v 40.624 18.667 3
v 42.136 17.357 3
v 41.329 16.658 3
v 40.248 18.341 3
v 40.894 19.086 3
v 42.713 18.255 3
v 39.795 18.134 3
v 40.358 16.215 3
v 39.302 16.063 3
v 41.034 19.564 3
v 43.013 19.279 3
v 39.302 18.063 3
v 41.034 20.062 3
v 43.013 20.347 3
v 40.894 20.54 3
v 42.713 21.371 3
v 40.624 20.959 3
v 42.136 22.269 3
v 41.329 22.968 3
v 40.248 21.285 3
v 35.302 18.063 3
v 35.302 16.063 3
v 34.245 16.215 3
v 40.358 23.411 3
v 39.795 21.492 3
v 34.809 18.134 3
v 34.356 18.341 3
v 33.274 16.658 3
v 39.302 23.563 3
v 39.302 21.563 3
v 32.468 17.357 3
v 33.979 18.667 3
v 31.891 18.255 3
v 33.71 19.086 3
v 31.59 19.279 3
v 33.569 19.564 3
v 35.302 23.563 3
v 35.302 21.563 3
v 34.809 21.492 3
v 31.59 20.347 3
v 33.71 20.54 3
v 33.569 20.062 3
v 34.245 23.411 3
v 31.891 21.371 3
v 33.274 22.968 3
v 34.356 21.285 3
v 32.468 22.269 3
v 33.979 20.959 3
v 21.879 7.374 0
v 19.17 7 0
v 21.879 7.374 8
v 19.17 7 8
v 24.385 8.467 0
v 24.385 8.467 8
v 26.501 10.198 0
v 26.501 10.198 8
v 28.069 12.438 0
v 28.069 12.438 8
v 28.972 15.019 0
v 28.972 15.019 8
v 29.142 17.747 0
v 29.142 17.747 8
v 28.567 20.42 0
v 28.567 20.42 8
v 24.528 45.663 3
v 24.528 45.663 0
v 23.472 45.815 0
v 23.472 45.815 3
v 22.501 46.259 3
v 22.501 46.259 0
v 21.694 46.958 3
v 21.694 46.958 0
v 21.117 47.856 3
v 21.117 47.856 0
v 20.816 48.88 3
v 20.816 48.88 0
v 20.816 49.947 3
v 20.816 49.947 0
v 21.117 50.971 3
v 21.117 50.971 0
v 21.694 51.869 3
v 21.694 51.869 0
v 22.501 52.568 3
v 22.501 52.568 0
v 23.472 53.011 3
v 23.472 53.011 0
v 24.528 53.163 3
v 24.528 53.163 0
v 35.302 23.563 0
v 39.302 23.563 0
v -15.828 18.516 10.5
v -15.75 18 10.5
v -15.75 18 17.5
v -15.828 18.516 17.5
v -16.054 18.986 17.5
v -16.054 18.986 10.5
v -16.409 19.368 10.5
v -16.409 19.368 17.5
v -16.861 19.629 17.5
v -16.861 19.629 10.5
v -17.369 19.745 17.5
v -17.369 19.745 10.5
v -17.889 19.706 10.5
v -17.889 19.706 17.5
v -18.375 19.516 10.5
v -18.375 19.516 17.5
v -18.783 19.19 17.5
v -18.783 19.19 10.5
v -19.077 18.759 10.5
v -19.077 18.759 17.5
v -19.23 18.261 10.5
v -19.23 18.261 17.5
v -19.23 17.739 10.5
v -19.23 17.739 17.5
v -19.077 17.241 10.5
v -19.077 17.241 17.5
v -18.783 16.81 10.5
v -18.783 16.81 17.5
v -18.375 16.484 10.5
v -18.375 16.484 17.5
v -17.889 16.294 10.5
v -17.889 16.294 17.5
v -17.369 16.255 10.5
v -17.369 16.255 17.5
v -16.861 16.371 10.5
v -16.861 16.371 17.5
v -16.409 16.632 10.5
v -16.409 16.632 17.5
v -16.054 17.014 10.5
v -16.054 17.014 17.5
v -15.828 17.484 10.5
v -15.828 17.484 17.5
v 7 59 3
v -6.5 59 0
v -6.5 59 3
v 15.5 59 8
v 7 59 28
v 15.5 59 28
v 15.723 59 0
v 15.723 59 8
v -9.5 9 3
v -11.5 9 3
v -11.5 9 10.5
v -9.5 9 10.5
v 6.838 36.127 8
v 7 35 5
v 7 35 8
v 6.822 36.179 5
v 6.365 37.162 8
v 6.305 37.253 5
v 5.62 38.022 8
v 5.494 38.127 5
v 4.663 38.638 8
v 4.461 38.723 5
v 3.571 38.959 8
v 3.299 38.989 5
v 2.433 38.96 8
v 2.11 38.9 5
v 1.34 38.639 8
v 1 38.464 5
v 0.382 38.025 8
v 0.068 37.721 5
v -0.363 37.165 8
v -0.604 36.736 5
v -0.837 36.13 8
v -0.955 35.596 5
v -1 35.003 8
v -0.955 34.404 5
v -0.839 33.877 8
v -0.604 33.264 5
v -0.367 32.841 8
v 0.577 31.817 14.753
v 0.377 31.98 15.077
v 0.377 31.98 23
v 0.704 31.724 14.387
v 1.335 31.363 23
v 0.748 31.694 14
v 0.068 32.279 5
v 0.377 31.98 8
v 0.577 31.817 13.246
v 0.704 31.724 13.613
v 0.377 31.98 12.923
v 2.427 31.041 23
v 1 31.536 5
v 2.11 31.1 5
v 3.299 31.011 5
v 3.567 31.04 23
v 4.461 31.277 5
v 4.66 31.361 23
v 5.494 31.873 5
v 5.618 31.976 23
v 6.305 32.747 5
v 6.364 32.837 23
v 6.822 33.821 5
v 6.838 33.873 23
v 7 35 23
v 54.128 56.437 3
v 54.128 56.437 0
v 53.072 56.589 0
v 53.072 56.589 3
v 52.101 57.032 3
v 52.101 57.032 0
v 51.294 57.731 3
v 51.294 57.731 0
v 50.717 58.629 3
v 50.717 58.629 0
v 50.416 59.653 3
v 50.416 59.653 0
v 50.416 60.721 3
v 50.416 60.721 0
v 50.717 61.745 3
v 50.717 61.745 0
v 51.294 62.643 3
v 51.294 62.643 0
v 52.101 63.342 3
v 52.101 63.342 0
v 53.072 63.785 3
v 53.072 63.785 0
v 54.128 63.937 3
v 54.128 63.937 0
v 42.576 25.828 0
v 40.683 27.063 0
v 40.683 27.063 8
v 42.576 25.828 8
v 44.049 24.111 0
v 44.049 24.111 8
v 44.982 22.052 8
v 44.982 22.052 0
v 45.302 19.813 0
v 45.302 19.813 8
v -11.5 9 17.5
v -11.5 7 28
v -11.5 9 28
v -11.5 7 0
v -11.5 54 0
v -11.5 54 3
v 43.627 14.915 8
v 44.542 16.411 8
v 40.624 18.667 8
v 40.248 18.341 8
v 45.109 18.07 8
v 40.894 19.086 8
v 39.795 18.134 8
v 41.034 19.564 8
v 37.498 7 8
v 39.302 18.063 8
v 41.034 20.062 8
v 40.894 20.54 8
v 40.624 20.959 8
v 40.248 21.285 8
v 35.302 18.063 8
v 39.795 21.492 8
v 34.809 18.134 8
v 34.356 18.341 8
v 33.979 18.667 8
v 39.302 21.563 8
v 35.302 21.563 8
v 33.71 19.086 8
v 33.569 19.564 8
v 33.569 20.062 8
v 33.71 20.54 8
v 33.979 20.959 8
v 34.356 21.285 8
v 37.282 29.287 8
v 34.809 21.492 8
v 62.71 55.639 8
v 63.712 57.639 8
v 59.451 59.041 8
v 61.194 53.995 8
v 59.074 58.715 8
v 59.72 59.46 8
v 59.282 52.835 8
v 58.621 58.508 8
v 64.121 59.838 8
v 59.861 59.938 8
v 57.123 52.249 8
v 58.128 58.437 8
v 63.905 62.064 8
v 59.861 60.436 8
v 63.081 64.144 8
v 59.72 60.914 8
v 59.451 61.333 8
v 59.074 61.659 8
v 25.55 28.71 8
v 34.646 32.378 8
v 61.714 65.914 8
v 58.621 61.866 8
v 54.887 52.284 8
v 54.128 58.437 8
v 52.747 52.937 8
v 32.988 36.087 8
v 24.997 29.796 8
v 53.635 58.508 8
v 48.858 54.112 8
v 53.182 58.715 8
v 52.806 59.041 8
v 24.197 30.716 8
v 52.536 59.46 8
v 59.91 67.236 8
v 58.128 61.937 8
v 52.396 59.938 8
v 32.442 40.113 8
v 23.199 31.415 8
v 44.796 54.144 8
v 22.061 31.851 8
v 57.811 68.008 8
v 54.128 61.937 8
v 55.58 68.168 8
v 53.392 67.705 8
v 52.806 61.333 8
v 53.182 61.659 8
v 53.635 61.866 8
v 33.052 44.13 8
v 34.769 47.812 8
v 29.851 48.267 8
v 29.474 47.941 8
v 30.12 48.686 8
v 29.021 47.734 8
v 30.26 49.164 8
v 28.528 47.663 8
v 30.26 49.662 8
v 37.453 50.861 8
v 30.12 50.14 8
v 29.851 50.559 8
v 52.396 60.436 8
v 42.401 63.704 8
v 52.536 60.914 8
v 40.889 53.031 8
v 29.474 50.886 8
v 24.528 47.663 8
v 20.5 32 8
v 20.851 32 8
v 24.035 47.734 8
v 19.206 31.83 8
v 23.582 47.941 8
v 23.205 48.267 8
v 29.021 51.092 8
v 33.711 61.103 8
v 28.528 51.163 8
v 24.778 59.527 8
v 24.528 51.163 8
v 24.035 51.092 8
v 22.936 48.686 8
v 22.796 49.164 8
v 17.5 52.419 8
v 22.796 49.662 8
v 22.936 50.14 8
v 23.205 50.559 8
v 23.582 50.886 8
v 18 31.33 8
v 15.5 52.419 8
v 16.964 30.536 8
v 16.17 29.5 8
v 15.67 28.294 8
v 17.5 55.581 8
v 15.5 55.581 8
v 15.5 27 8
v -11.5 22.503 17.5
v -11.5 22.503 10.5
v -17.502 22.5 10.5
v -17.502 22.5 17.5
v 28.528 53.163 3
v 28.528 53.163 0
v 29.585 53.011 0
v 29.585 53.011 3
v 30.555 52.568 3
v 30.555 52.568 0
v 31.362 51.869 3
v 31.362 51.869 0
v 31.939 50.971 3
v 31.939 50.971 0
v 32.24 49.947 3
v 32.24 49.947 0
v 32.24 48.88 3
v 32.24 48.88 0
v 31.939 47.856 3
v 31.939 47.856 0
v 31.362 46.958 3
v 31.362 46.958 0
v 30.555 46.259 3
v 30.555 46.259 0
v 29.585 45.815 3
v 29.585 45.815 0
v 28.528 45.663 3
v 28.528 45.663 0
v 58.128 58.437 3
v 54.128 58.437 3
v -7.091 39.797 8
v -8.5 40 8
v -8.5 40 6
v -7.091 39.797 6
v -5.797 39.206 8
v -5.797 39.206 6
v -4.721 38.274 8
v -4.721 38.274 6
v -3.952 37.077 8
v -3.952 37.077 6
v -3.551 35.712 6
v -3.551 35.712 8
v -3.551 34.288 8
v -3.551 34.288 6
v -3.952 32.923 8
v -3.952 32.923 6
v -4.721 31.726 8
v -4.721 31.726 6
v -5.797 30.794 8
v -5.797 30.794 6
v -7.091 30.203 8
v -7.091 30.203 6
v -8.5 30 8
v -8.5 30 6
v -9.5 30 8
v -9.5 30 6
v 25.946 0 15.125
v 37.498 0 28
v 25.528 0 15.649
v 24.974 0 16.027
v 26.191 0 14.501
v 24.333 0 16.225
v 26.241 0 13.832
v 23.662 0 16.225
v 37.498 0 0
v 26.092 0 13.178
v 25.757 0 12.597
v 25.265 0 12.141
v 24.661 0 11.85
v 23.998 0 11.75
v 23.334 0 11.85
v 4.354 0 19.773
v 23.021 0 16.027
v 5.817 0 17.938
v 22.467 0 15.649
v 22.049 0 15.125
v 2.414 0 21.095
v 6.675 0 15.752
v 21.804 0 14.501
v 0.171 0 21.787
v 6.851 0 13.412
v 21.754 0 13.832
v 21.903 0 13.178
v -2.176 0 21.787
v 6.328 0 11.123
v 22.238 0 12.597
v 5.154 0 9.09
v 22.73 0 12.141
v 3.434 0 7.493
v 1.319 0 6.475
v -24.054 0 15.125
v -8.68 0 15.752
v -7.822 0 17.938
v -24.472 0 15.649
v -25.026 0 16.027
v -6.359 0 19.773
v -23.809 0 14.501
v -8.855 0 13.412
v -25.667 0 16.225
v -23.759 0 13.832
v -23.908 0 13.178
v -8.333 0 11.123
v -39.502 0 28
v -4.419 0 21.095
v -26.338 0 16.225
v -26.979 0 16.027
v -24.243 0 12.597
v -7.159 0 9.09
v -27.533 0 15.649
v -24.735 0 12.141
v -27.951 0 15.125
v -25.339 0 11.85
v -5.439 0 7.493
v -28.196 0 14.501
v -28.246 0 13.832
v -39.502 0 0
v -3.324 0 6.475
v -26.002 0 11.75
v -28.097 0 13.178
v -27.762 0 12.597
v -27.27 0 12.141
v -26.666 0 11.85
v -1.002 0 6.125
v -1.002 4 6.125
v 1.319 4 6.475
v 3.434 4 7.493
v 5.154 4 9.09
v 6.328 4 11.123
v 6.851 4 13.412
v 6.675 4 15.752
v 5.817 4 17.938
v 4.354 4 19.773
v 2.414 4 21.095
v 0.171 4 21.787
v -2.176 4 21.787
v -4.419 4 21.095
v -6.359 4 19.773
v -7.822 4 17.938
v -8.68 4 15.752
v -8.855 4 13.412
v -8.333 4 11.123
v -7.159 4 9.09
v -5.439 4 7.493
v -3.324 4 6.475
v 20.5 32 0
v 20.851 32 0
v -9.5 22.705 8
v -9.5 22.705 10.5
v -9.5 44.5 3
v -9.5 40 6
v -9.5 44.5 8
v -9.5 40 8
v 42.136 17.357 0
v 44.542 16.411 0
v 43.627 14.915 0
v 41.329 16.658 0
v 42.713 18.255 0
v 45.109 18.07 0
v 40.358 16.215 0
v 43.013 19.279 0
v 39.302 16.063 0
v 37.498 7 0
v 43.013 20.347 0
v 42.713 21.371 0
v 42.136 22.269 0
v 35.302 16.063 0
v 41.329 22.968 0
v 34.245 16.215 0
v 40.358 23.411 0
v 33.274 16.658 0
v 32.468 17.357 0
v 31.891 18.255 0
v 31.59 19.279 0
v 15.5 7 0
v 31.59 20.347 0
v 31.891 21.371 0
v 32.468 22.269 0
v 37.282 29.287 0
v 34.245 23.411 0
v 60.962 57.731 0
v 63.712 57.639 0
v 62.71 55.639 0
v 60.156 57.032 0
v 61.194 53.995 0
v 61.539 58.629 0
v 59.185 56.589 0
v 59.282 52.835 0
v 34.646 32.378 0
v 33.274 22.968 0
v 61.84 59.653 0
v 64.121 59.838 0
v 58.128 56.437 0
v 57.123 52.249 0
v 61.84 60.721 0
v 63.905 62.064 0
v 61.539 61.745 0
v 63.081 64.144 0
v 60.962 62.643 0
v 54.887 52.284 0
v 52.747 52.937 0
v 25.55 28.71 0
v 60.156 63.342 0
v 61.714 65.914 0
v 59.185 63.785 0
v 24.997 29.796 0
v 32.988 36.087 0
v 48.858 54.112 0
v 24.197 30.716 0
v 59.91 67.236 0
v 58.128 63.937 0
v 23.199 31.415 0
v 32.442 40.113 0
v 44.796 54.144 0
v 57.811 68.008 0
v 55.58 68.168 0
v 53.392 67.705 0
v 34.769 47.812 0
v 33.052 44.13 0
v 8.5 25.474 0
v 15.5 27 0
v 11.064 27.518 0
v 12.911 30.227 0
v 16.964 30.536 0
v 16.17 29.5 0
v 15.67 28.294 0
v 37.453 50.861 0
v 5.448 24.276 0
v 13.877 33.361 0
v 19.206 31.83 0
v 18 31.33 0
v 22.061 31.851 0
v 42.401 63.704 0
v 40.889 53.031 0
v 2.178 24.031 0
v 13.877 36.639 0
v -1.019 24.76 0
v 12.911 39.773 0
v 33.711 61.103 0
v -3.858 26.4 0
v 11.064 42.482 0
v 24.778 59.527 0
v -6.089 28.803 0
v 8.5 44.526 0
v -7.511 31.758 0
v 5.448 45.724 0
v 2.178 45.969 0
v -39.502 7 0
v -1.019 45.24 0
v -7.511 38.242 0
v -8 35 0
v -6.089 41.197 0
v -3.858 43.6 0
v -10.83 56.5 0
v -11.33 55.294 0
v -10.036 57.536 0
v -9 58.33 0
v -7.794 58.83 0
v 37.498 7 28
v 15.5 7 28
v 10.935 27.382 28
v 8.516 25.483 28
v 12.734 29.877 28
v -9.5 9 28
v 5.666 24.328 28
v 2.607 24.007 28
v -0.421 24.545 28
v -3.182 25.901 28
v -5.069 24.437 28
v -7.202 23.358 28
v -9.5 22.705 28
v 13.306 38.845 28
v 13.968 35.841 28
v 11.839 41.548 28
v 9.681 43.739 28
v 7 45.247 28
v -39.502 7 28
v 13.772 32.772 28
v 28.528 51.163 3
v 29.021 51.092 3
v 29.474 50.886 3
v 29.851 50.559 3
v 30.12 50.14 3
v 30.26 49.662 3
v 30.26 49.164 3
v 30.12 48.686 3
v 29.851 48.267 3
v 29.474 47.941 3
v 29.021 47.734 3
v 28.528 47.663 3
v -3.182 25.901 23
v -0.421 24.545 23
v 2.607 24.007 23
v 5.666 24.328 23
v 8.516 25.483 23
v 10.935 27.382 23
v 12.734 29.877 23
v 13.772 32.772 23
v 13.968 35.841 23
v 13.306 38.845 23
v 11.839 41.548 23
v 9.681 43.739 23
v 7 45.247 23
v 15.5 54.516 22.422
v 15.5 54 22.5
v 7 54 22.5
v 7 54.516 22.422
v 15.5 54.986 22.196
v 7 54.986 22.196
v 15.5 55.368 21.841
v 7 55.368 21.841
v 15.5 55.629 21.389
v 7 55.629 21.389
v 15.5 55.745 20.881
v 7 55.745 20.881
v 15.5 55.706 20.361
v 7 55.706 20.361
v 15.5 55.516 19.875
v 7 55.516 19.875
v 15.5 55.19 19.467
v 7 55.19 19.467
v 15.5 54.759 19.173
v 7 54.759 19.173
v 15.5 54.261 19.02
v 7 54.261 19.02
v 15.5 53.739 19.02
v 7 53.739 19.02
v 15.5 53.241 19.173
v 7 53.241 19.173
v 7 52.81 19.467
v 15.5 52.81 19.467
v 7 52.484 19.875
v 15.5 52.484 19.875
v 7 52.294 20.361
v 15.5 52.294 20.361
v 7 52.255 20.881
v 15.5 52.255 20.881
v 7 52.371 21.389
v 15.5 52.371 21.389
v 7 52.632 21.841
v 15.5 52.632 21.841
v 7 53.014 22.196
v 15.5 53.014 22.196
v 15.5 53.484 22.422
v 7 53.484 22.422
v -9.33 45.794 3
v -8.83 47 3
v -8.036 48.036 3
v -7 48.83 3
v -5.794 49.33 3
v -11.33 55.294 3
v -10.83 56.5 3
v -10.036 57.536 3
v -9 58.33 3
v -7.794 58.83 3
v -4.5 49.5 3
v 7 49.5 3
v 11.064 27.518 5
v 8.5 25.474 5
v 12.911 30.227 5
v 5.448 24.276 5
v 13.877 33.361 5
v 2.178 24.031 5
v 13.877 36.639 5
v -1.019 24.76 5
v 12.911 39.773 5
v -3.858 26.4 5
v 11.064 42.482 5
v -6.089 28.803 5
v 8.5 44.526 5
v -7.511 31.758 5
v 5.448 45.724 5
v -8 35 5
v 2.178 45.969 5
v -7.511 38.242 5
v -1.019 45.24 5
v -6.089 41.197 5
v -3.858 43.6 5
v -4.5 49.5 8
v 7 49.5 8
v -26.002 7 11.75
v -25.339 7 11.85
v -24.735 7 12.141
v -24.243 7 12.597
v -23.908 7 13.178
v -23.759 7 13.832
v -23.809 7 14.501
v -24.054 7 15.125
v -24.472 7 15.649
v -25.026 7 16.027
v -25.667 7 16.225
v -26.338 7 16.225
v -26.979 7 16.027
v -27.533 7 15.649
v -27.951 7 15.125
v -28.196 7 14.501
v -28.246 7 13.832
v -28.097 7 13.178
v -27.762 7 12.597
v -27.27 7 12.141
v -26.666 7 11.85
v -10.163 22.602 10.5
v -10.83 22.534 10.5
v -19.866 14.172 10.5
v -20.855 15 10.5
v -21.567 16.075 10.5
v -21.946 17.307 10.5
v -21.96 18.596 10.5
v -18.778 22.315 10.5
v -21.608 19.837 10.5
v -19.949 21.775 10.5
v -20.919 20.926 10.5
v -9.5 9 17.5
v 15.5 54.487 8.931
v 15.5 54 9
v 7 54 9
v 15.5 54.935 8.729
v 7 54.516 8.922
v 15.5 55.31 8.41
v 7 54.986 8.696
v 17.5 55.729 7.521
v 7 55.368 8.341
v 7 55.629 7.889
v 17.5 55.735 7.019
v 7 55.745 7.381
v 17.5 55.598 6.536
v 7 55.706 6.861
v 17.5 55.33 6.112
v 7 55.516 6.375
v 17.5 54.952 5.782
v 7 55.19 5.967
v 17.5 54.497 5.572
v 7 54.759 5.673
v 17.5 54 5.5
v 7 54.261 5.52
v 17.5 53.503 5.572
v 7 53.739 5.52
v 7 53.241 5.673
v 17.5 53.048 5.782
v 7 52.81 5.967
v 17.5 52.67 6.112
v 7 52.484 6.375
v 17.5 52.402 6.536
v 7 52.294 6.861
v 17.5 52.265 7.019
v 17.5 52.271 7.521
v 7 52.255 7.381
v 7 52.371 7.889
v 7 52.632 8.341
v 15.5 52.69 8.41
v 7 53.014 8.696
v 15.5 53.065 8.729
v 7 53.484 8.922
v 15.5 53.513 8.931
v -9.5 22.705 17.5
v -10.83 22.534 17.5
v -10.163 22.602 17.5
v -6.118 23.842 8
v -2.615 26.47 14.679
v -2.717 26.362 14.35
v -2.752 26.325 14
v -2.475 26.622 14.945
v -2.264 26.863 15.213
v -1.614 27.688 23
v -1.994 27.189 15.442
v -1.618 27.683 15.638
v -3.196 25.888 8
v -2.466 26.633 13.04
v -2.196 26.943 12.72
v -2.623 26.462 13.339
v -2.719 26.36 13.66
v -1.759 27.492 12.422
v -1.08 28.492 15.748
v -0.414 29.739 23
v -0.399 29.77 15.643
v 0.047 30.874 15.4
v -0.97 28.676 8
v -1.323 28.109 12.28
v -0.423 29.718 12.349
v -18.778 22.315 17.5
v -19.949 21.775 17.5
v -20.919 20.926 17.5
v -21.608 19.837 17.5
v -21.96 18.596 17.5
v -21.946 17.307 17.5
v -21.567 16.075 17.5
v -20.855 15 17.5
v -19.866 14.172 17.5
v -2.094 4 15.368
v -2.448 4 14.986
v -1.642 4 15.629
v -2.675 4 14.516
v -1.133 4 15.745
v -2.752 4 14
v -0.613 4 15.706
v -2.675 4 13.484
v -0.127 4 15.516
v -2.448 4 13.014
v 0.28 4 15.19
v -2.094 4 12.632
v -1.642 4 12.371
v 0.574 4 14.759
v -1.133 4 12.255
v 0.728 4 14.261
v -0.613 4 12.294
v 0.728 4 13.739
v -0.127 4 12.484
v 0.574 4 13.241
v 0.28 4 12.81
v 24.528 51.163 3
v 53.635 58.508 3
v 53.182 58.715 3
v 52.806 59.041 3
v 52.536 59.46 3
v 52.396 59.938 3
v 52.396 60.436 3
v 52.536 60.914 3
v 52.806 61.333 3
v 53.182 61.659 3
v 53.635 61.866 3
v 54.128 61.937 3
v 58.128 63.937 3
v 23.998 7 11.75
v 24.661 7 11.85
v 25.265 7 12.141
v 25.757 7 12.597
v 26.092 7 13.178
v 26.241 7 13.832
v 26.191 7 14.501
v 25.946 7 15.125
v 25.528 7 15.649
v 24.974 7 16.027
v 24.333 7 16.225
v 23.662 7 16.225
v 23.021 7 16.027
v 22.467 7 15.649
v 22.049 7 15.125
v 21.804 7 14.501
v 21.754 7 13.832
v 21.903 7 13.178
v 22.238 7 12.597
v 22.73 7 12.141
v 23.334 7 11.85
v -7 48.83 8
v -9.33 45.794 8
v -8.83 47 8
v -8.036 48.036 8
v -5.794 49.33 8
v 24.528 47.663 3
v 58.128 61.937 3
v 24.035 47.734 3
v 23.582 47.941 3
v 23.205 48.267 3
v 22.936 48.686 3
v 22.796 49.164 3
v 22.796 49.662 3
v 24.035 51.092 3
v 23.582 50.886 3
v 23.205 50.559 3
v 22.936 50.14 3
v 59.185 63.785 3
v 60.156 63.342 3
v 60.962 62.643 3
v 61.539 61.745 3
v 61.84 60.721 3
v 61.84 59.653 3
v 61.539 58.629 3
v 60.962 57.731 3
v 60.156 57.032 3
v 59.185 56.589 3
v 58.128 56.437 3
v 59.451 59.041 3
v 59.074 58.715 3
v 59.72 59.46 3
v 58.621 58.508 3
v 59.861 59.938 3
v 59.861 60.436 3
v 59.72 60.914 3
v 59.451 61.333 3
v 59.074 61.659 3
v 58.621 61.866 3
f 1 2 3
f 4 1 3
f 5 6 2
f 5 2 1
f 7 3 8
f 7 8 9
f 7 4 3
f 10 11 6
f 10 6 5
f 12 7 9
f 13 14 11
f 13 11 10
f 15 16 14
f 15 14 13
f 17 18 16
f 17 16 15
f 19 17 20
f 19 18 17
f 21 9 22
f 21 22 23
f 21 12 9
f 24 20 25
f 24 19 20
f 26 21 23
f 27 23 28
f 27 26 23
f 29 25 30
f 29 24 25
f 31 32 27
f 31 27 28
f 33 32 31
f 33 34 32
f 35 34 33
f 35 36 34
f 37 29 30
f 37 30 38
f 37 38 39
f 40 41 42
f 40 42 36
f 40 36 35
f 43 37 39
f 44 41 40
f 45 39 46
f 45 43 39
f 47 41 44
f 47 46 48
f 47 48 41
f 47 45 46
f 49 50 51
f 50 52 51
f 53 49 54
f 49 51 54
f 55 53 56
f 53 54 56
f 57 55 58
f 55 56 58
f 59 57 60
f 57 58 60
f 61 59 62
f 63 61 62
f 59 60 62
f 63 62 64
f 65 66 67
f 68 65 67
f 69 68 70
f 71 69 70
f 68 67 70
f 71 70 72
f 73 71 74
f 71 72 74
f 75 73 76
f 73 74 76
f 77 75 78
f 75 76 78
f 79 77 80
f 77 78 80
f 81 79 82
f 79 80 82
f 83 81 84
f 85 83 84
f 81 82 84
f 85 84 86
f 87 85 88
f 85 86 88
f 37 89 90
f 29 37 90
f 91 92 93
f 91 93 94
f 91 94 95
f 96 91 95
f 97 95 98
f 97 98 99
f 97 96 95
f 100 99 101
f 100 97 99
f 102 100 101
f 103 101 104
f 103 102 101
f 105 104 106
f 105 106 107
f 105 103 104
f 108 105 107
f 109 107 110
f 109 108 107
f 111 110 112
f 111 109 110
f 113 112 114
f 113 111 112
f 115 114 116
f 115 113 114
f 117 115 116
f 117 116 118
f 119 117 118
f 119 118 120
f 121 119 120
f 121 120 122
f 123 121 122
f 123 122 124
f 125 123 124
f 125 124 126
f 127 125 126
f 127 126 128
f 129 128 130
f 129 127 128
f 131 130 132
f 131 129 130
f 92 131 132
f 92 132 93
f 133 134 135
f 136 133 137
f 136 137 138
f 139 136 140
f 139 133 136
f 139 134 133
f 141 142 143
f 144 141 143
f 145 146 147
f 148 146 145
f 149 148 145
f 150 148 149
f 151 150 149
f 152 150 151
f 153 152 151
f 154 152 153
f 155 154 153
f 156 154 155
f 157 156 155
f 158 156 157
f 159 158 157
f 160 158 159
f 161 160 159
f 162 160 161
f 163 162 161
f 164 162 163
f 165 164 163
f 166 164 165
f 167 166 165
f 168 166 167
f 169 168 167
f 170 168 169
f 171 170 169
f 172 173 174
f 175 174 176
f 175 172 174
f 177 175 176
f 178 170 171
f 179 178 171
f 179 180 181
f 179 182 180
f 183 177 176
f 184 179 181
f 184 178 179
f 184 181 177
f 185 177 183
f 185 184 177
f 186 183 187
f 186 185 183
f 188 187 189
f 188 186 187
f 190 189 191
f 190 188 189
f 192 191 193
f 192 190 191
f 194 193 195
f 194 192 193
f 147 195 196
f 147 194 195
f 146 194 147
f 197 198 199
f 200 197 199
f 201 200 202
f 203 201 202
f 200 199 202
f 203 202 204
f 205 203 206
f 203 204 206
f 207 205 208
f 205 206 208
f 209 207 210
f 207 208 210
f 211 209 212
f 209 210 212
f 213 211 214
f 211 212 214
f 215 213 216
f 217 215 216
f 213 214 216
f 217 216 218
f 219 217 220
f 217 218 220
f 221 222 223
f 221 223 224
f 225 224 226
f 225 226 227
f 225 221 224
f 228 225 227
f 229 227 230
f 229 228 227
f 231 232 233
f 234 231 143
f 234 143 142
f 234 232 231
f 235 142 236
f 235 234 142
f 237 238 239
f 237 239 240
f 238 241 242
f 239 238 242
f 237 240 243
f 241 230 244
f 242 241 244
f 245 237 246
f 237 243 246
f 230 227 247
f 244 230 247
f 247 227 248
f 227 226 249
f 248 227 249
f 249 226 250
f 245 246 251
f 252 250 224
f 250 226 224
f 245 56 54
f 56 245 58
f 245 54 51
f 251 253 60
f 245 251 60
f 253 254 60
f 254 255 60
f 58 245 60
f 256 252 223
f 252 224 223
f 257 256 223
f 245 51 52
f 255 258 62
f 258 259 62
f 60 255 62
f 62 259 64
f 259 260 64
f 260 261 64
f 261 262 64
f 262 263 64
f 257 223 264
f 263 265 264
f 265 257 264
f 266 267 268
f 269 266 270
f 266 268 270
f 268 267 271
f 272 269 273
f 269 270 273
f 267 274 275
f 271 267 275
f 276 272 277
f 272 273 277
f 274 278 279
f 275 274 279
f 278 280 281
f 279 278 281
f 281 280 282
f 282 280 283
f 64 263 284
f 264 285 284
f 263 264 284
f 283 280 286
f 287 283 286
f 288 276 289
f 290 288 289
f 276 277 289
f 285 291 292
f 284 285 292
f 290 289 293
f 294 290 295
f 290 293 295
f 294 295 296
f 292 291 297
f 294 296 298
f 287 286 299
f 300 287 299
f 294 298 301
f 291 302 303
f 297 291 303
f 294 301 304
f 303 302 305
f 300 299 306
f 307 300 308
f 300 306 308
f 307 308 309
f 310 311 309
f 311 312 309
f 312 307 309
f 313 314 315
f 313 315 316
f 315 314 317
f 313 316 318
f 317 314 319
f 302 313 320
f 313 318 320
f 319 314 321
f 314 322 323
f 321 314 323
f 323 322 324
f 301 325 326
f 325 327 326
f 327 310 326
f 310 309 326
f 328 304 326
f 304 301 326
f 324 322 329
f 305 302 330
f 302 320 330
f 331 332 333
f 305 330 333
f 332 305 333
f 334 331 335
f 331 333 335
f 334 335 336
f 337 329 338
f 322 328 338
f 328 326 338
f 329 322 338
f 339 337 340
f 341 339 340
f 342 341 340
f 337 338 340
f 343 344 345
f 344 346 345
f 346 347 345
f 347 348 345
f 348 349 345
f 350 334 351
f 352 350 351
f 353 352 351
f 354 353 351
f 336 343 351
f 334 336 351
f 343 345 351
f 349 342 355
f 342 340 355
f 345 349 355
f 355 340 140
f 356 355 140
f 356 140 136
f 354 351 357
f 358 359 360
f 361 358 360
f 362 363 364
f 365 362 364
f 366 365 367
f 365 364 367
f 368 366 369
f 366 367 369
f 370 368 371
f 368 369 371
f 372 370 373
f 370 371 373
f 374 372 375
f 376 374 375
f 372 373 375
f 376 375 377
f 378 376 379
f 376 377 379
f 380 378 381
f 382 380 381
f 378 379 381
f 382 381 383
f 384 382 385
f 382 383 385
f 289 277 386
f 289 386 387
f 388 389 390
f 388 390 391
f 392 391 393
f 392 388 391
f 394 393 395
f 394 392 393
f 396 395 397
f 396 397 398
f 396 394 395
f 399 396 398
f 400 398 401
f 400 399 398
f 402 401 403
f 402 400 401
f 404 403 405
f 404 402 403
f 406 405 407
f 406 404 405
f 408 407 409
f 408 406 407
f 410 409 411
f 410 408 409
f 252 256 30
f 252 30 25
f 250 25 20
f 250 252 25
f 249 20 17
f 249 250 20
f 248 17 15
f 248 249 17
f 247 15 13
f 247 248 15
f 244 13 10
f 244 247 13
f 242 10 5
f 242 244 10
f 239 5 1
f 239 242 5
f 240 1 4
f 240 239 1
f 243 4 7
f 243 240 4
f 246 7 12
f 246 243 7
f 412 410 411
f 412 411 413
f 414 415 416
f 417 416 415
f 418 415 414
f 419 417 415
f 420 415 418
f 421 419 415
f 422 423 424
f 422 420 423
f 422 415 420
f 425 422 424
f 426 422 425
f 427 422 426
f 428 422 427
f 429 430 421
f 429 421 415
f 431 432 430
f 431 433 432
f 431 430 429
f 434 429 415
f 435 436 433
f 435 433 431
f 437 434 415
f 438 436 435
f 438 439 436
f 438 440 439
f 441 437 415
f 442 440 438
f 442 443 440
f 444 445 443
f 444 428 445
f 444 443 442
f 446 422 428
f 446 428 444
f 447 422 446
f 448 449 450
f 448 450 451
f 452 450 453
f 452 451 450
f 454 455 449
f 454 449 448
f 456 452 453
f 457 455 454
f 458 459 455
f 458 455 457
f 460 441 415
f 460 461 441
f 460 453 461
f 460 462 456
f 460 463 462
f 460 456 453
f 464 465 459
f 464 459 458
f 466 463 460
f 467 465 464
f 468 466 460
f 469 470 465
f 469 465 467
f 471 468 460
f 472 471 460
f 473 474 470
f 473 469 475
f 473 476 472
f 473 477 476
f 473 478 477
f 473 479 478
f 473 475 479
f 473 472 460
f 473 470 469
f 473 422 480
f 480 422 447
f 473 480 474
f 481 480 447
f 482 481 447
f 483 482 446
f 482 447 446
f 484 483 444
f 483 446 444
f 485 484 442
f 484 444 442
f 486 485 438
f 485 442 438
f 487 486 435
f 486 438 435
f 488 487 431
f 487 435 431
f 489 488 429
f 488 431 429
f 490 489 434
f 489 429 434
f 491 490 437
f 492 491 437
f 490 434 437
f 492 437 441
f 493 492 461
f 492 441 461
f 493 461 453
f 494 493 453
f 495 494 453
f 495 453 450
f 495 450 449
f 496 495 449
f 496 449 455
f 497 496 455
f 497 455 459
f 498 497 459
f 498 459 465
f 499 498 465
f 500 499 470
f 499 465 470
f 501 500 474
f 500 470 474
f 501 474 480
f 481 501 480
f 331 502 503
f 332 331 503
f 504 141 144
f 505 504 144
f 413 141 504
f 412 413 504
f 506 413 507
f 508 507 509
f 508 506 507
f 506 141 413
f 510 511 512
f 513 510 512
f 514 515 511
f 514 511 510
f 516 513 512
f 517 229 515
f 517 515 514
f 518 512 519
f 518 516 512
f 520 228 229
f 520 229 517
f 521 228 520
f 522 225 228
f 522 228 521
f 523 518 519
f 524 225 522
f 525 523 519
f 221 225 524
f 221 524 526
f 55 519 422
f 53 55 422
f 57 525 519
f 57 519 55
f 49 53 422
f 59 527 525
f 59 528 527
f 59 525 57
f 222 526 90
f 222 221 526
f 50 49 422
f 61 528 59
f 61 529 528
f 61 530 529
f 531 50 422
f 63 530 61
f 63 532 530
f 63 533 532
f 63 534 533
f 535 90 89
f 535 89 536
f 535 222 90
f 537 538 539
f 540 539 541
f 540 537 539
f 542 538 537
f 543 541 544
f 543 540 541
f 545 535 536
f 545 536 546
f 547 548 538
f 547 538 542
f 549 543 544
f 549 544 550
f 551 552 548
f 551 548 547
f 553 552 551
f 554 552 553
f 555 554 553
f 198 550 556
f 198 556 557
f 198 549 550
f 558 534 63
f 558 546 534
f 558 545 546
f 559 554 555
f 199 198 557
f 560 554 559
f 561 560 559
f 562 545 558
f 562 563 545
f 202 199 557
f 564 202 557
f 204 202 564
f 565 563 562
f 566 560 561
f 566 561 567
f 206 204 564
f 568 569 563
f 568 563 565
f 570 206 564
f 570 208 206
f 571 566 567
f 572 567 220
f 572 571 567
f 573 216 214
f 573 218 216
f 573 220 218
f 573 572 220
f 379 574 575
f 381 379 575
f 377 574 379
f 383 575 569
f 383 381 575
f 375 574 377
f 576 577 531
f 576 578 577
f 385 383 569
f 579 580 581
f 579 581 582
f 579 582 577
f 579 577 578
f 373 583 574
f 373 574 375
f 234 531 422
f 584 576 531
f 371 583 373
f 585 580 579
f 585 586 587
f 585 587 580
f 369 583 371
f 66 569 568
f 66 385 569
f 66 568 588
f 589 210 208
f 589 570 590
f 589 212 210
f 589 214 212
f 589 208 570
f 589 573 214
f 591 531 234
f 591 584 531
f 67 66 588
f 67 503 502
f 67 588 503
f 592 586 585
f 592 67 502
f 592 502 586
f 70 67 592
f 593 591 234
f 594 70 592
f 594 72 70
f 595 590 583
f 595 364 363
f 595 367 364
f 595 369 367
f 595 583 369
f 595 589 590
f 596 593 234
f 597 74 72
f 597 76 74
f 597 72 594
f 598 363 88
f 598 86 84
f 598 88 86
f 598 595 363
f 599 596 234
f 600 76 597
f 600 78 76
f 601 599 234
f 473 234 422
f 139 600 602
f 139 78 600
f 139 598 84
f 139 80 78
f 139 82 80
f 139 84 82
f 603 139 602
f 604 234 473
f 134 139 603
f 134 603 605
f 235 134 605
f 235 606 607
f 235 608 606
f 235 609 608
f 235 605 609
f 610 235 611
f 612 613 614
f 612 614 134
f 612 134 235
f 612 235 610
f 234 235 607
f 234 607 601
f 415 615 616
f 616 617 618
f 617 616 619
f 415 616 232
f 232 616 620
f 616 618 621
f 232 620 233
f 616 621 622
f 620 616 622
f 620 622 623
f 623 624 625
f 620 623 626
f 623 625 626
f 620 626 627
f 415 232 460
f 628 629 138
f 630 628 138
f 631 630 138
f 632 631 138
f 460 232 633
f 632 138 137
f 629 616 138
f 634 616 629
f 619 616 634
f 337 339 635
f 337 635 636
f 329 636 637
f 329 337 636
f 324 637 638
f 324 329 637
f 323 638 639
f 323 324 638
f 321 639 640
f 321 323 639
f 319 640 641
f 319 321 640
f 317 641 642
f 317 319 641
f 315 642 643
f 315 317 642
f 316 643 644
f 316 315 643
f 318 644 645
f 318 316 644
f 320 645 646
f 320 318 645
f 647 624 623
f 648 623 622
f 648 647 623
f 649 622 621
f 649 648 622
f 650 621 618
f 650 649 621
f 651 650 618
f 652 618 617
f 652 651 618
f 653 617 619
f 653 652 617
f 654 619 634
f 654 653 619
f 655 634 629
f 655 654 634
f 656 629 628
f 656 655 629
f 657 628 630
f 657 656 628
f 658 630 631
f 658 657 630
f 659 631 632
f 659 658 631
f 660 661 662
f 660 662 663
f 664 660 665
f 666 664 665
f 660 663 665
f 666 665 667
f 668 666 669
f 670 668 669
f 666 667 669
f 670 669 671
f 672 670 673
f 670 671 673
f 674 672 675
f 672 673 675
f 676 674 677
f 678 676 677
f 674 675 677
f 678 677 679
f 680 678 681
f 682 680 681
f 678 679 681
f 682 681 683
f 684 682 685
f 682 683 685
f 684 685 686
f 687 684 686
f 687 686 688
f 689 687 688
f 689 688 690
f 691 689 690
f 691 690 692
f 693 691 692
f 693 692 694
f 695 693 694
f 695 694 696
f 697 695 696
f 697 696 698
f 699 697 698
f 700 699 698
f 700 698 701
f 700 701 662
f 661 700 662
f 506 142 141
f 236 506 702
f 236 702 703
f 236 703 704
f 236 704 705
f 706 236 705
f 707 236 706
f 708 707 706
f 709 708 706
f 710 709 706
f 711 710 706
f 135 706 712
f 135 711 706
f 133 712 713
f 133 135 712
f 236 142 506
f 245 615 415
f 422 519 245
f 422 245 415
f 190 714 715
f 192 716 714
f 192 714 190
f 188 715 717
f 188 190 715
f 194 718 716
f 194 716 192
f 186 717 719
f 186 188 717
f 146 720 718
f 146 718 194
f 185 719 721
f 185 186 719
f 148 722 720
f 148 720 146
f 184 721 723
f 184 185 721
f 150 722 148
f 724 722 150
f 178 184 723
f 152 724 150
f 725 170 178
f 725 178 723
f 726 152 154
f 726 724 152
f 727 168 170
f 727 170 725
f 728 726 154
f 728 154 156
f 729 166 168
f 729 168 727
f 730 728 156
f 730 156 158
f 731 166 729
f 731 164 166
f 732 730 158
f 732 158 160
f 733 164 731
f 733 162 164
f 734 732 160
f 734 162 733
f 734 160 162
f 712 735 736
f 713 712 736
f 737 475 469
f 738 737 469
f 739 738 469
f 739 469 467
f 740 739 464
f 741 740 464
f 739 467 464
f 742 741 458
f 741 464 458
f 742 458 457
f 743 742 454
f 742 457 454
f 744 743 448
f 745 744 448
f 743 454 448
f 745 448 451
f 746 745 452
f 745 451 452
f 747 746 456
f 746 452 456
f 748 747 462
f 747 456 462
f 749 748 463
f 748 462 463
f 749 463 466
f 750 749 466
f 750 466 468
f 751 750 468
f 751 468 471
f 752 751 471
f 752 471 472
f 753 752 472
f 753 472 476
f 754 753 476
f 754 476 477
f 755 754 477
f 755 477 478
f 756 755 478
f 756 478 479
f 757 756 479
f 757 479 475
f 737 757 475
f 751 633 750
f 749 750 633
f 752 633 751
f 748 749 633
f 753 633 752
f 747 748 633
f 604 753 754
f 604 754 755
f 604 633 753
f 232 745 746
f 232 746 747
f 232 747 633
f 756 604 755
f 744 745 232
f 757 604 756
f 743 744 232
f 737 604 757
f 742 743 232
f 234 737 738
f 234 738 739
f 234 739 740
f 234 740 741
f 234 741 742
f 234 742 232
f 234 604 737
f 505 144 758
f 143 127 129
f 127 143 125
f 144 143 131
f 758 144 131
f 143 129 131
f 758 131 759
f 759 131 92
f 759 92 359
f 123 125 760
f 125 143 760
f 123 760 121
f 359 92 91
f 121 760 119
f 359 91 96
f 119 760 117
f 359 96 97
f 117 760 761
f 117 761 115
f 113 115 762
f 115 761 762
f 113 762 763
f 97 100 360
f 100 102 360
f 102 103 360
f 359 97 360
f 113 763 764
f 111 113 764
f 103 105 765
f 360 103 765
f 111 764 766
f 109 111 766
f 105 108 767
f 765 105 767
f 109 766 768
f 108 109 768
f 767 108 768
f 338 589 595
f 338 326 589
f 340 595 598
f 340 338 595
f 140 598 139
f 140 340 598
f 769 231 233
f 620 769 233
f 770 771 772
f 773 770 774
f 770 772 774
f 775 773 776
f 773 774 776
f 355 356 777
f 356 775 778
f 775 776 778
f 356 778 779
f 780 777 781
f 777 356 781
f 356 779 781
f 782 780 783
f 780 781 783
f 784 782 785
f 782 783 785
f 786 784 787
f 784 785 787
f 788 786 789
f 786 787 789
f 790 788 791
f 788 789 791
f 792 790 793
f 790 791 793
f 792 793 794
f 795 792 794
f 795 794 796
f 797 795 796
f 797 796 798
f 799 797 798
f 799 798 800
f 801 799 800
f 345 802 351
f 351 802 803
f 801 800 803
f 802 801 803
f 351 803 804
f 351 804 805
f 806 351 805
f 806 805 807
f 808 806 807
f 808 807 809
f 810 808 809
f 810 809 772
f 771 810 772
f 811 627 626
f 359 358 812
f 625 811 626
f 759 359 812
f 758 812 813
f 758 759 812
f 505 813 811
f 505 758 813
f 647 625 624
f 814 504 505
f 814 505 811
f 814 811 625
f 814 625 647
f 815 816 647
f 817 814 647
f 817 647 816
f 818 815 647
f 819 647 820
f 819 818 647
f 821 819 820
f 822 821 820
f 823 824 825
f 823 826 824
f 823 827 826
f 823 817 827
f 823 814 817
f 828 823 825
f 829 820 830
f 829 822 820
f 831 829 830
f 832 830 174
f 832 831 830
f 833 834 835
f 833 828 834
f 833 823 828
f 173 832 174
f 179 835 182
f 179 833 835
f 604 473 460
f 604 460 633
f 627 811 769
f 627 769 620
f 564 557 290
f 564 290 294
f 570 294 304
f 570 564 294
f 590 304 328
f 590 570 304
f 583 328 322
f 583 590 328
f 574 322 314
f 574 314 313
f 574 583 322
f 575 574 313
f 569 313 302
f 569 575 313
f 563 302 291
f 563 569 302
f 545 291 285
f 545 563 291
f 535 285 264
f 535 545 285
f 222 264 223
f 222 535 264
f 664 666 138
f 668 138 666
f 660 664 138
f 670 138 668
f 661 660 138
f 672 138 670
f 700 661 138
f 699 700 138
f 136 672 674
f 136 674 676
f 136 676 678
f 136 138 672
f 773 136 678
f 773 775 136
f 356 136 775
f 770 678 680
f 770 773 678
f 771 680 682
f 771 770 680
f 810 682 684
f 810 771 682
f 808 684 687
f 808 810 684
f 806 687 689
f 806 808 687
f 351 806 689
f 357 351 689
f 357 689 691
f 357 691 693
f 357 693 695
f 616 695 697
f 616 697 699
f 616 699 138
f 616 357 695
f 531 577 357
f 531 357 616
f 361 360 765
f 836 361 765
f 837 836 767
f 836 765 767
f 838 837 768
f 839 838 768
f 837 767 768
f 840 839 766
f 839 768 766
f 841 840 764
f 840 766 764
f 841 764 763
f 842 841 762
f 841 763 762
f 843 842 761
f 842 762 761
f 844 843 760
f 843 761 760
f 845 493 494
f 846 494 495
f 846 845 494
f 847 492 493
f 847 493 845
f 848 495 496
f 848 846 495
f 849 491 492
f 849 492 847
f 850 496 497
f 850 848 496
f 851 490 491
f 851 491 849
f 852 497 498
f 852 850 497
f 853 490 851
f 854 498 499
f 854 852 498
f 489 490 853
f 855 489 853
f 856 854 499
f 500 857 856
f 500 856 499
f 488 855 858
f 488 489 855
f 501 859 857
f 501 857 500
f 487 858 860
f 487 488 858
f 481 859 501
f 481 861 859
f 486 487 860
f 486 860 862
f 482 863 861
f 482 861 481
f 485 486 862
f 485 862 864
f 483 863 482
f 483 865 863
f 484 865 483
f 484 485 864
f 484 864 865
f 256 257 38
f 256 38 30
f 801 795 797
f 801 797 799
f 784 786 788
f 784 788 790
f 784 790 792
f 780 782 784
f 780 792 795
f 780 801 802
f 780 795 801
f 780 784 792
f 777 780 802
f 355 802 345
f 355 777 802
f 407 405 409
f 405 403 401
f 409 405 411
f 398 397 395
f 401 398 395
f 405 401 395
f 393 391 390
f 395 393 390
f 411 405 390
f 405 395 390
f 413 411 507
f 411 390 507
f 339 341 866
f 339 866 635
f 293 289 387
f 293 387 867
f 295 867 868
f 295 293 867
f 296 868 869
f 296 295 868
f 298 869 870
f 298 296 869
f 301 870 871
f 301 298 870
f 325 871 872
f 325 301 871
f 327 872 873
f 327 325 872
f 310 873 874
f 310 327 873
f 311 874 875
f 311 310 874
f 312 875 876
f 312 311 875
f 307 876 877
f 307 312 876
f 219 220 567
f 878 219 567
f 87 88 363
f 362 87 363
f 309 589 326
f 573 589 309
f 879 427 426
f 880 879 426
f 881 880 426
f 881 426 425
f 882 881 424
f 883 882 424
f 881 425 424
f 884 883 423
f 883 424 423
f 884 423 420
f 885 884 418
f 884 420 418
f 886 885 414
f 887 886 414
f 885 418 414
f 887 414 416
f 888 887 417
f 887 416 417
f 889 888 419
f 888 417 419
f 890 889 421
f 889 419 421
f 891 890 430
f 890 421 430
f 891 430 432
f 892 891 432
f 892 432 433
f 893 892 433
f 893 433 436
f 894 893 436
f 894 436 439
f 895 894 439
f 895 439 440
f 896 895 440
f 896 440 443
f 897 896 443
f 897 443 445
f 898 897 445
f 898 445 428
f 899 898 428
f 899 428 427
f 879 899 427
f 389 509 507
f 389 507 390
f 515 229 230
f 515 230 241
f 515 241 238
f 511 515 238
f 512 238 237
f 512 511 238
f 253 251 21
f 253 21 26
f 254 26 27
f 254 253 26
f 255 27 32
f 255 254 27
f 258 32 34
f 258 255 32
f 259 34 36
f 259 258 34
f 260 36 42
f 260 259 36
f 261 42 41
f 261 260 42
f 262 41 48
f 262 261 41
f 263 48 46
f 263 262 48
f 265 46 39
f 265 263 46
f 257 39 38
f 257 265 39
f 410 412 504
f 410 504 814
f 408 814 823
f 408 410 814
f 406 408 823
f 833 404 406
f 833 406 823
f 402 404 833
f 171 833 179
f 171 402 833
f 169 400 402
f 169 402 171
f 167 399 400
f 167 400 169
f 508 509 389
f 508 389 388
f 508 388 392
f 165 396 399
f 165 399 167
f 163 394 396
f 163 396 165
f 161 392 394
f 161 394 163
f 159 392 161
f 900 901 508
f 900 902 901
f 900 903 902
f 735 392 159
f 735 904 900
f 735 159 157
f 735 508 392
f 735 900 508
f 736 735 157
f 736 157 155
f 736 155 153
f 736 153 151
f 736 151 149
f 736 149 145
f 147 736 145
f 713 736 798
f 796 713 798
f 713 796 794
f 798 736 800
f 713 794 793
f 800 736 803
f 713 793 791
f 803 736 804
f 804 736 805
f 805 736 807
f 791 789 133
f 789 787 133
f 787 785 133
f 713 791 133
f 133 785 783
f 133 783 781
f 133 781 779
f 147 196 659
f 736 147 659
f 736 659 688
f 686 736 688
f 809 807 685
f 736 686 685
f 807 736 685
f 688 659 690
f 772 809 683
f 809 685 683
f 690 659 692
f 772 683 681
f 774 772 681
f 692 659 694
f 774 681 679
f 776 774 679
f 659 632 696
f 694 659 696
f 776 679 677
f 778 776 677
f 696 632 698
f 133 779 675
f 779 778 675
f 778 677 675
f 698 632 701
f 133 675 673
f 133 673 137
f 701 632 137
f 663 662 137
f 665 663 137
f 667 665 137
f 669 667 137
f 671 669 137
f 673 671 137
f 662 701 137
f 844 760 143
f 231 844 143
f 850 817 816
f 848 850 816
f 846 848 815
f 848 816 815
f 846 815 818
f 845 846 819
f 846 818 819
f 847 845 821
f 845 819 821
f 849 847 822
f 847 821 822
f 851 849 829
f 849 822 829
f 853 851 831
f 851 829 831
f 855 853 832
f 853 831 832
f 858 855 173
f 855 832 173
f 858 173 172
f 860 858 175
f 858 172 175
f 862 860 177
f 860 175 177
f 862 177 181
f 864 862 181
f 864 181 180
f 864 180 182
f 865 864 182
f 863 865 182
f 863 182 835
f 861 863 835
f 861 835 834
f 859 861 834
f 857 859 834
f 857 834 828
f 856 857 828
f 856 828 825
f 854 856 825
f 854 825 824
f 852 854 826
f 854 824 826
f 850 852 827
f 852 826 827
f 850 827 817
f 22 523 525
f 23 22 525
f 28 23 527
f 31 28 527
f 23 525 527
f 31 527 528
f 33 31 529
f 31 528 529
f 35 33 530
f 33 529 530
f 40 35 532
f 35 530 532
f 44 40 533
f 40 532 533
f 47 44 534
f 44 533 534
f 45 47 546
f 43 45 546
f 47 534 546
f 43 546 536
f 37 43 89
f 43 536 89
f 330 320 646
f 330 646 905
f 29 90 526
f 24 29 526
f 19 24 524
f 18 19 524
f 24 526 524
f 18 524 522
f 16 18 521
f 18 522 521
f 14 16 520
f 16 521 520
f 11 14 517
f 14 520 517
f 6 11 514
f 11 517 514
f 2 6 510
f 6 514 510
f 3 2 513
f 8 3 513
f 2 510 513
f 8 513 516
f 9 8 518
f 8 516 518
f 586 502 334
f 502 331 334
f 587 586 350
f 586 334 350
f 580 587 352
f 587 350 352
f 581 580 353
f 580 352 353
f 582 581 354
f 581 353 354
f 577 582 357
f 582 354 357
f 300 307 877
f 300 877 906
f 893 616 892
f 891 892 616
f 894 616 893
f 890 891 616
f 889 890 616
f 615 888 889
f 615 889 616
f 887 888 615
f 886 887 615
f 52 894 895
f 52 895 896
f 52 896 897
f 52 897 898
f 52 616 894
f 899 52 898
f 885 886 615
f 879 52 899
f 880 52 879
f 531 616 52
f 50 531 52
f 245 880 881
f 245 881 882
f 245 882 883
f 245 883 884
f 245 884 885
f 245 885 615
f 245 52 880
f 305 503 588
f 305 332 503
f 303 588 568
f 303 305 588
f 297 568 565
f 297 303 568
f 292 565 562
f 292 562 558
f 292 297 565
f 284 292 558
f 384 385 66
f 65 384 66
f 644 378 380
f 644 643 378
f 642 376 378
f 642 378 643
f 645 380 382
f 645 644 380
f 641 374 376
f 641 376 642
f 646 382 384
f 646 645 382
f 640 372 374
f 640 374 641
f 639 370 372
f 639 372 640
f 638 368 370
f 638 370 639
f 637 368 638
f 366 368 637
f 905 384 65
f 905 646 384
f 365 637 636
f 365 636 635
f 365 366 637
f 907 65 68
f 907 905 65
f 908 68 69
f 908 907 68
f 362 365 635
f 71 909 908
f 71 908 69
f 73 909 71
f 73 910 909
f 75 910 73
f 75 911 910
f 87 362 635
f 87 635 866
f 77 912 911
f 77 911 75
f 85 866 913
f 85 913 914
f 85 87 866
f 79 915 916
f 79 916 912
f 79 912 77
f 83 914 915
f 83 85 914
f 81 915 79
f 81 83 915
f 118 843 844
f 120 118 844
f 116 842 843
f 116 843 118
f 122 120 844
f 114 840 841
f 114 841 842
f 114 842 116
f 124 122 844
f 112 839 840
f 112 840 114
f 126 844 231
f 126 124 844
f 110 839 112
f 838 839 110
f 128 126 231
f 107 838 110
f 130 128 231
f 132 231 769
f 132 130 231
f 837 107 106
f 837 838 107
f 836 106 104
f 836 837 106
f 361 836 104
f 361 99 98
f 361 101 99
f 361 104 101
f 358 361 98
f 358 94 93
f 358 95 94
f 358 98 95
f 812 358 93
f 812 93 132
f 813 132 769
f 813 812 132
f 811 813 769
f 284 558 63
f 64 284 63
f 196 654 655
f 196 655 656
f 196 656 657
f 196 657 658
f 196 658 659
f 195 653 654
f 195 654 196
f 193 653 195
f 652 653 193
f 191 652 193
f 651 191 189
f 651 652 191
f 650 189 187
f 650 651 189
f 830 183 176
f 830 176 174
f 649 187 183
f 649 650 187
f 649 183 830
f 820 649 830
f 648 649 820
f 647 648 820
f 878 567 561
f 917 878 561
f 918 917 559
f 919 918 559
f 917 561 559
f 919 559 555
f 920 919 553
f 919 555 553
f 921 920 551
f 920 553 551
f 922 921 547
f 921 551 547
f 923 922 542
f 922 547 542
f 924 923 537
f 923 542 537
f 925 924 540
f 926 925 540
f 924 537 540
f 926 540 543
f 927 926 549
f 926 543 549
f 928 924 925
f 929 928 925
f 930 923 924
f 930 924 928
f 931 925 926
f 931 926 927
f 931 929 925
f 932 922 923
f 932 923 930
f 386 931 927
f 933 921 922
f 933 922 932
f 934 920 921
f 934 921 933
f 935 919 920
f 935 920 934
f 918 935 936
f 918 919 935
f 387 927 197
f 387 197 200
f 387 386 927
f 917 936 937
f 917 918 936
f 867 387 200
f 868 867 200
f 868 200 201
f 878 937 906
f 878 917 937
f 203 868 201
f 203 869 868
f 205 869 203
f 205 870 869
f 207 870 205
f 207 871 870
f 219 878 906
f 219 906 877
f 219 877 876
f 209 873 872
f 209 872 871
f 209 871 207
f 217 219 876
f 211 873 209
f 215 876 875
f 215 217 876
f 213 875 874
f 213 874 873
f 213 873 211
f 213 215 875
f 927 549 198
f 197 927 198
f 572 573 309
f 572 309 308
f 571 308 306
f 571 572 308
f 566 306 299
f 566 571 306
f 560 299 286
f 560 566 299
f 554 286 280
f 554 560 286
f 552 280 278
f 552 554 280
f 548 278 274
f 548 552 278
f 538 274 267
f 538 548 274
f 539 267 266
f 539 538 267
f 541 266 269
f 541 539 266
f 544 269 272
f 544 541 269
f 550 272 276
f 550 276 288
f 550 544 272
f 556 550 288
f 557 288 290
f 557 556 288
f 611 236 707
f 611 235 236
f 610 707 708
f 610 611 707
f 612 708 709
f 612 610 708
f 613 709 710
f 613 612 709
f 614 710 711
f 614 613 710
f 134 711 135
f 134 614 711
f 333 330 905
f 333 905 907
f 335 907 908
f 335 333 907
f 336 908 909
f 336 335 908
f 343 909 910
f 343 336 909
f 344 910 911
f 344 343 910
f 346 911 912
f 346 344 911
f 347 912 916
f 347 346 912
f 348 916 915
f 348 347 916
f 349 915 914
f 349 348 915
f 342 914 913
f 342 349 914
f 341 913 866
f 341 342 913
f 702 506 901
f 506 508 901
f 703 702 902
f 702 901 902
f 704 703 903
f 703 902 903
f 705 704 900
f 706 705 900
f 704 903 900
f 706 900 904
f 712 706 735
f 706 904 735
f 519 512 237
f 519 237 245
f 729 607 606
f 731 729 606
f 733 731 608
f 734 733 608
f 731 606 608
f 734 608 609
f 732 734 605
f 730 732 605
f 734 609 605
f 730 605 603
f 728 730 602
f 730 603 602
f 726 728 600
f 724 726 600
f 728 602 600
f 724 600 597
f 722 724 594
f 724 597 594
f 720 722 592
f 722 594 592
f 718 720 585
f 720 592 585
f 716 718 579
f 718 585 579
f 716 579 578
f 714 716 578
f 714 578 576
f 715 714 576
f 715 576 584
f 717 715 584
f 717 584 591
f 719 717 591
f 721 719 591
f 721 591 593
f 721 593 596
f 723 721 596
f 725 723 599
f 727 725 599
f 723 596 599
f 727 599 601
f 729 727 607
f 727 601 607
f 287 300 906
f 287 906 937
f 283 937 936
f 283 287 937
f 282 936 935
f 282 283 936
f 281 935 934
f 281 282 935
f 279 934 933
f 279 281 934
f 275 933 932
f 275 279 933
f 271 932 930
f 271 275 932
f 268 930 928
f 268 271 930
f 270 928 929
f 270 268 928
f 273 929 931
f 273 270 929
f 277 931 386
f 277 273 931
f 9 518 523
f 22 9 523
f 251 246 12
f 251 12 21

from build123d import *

# Parameters (mm, degrees)
SKETCH5_R                = 4
BOSS_EXTRUDE1_DEPTH      = 8
SKETCH6_R                = 4
BOSS_EXTRUDE2_DEPTH      = 20
SKETCH7_R                = 7.875
CUT_EXTRUDE1_DEPTH       = 4
SKETCH8_R                = 1.75
CUT_EXTRUDE2_DEPTH       = 64
SKETCH9_R                = 2.25
CUT_EXTRUDE3_DEPTH       = 64
FILLET1_R                = 10
FILLET2_R                = 78
FILLET3_R                = 5
SKETCH10_R               = 11
CUT_EXTRUDE4_DEPTH       = 5
CUT_EXTRUDE5_START       = -5
SKETCH11_R               = 11
CUT_EXTRUDE5_DEPTH       = 5
SKETCH13_R               = 1.75
CUT_EXTRUDE7_DEPTH       = 29
FILLET4_R                = 5
CUT_EXTRUDE8_DEPTH       = 29
CUT_EXTRUDE9_DEPTH       = 3
CUT_EXTRUDE10_START      = -20
SKETCH18_R               = 12.5
CUT_EXTRUDE10_DEPTH      = 20
BOSS_EXTRUDE3_DEPTH      = 3.5
BOSS_EXTRUDE3_DEPTH_BACK = 3.5
SKETCH19_R               = 1.75
CUT_EXTRUDE11_REACH      = 99.703
SKETCH20_W               = 18.5
SKETCH20_H               = 24
SKETCH21_W               = 18.5
SKETCH21_H               = 9.5
CUT_EXTRUDE12_DEPTH      = 5
SKETCH22_W               = 7.5
SKETCH22_H               = 40.5
SKETCH22_W_2             = 10.5
SKETCH22_H_2             = 30.300820781
CUT_EXTRUDE13_DEPTH      = 2
FILLET5_R                = 5
CUT_EXTRUDE14_DEPTH      = 2


with BuildPart() as part:
    # Sketch5 → Boss-Extrude1 (new body)
    with BuildSketch(Plane.XY):
        with BuildLine():
            Line((37.49753719, 0), (-39.50246281, 0))
            Line((-39.50246281, 0), (-39.50246281, 7))
            Line((-39.50246281, 7), (-11.5, 7))
            Line((-11.5, 7), (-11.5, 59))
            Line((-11.5, 59), (29.476702455, 59))
            Line((29.476702455, 59), (53.392166362, 67.704517001))
            ThreePointArc((53.392166362, 67.704517001), (64.120713281, 59.838020936), (52.747381415, 52.936513738))
            ThreePointArc((52.747381415, 52.936513738), (33.77847225, 46.032395426), (40.682590563, 27.063486262))
            ThreePointArc((40.682590563, 27.063486262), (44.048776035, 24.111420832), (45.301644469, 19.813023965))
            ThreePointArc((45.301644469, 19.813023965), (44.871359708, 17.224701884), (43.62679167, 14.91480869))
            Line((43.62679167, 14.91480869), (37.49753719, 7))
            Line((37.49753719, 7), (37.49753719, 0))
        make_face()
        with Locations((3, 35)):
            Circle(SKETCH5_R, mode=Mode.SUBTRACT)
        Polygon((15.5, 7), (15.5, 32), (24.352525767, 32), (33.451781623, 7), align=None, mode=Mode.SUBTRACT)
    extrude(amount=BOSS_EXTRUDE1_DEPTH)

    # Sketch6 → Boss-Extrude2 (add)
    with BuildSketch(Plane.XY.offset(8)):
        Polygon((37.49753719, 0), (-39.50246281, 0), (-39.50246281, 7), (-11.5, 7), (-11.5, 59), (15.5, 59), (15.5, 7), (37.49753719, 7), align=None)
        with Locations((3, 35)):
            Circle(SKETCH6_R, mode=Mode.SUBTRACT)
    extrude(amount=BOSS_EXTRUDE2_DEPTH)

    # Sketch7 → Cut-Extrude1 (cut)
    with BuildSketch(Plane.XZ):
        with Locations(Location((-1.00246281, 14, 0), (0, 0, 270))):
            Circle(SKETCH7_R)
    extrude(amount=-CUT_EXTRUDE1_DEPTH, mode=Mode.SUBTRACT)

    # Sketch8 → Cut-Extrude2 (cut)
    with BuildSketch(Plane(origin=(0, 59, 0), x_dir=(1, 0, 0), z_dir=(0, 1, 0))):
        with Locations(Location((-1.00246281, -14, 0), (0, 0, 180))):
            Circle(SKETCH8_R)
    extrude(amount=-CUT_EXTRUDE2_DEPTH, mode=Mode.SUBTRACT)

    # Sketch9 → Cut-Extrude3 (cut)
    with BuildSketch(Plane.XZ):
        with Locations(Location((23.99753719, 14, 0), (0, 0, 270))):
            Circle(SKETCH9_R)
        with Locations(Location((-26.00246281, 14, 0), (0, 0, 270))):
            Circle(SKETCH9_R)
    extrude(amount=-CUT_EXTRUDE3_DEPTH, mode=Mode.SUBTRACT)

    # Fillet1
    fillet1_edges = [part.edges().sort_by_distance(p)[0] for p in [
        (33.451781623, 7, 4),
    ]]
    fillet(fillet1_edges, radius=FILLET1_R)

    # Fillet2
    fillet2_edges = [part.edges().sort_by_distance(p)[0] for p in [
        (29.476702455, 59, 4),
    ]]
    fillet(fillet2_edges, radius=FILLET2_R)

    # Fillet3
    fillet3_edges = [part.edges().sort_by_distance(p)[0] for p in [
        (15.5, 32, 4),
    ]]
    fillet(fillet3_edges, radius=FILLET3_R)

    # Sketch10 → Cut-Extrude4 (cut)
    with BuildSketch(Plane(origin=(0, 0, 0), x_dir=(-1, 0, 0), z_dir=(0, 0, -1))):
        with Locations((-3, 35)):
            Circle(SKETCH10_R)
    extrude(amount=-CUT_EXTRUDE4_DEPTH, mode=Mode.SUBTRACT)

    # Sketch11 → Cut-Extrude5 (cut)
    with BuildSketch(Plane.XY.offset(28).offset(CUT_EXTRUDE5_START)):
        with Locations(Location((3, 35, 0), (0, 0, 180))):
            Circle(SKETCH11_R)
    extrude(amount=CUT_EXTRUDE5_DEPTH, mode=Mode.SUBTRACT)

    # Sketch13 → Cut-Extrude7 (cut)
    with BuildSketch(Plane.ZY.offset(11.5)):
        with Locations((20.75, 54)):
            Circle(SKETCH13_R)
        with Locations((7.25, 54)):
            Circle(SKETCH13_R)
    extrude(amount=-CUT_EXTRUDE7_DEPTH, mode=Mode.SUBTRACT)

    # Fillet4
    fillet4_edges = [part.edges().sort_by_distance(p)[0] for p in [
        (24.352525767, 32, 4),
    ]]
    fillet(fillet4_edges, radius=FILLET4_R)

    # Sketch14 → Cut-Extrude8 (cut)
    with BuildSketch(Plane.XY.offset(8)):
        with BuildLine():
            Line((58.128327509, 58.436976035), (54.128327509, 58.436976035))
            ThreePointArc((54.128327509, 58.436976035), (52.378327509, 60.186976035), (54.128327509, 61.936976035))
            Line((54.128327509, 61.936976035), (58.128327509, 61.936976035))
            ThreePointArc((58.128327509, 61.936976035), (59.878327509, 60.186976035), (58.128327509, 58.436976035))
        make_face()
        with BuildLine():
            Line((39.301644469, 18.063023965), (35.301644469, 18.063023965))
            ThreePointArc((35.301644469, 18.063023965), (33.551644469, 19.813023965), (35.301644469, 21.563023965))
            Line((35.301644469, 21.563023965), (39.301644469, 21.563023965))
            ThreePointArc((39.301644469, 21.563023965), (41.051644469, 19.813023965), (39.301644469, 18.063023965))
        make_face()
        with BuildLine():
            Line((28.528009954, 47.66334152), (24.528009954, 47.66334152))
            ThreePointArc((24.528009954, 47.66334152), (22.778009954, 49.41334152), (24.528009954, 51.16334152))
            Line((24.528009954, 51.16334152), (28.528009954, 51.16334152))
            ThreePointArc((28.528009954, 51.16334152), (30.278009954, 49.41334152), (28.528009954, 47.66334152))
        make_face()
    extrude(amount=-CUT_EXTRUDE8_DEPTH, mode=Mode.SUBTRACT)

    # Sketch15 → Cut-Extrude9 (cut)
    with BuildSketch(Plane(origin=(0, 0, 0), x_dir=(-1, 0, 0), z_dir=(0, 0, -1))):
        with BuildLine():
            Line((-39.301644469, 16.063023965), (-35.301644469, 16.063023965))
            ThreePointArc((-35.301644469, 16.063023965), (-31.551644469, 19.813023965), (-35.301644469, 23.563023965))
            Line((-35.301644469, 23.563023965), (-39.301644469, 23.563023965))
            ThreePointArc((-39.301644469, 23.563023965), (-43.051644469, 19.813023965), (-39.301644469, 16.063023965))
        make_face()
        with BuildLine():
            Line((-24.528009954, 53.16334152), (-28.528009954, 53.16334152))
            ThreePointArc((-28.528009954, 53.16334152), (-32.278009954, 49.41334152), (-28.528009954, 45.66334152))
            Line((-28.528009954, 45.66334152), (-24.528009954, 45.66334152))
            ThreePointArc((-24.528009954, 45.66334152), (-20.778009954, 49.41334152), (-24.528009954, 53.16334152))
        make_face()
        with BuildLine():
            Line((-54.128327509, 63.936976035), (-58.128327509, 63.936976035))
            ThreePointArc((-58.128327509, 63.936976035), (-61.878327509, 60.186976035), (-58.128327509, 56.436976035))
            Line((-58.128327509, 56.436976035), (-54.128327509, 56.436976035))
            ThreePointArc((-54.128327509, 56.436976035), (-50.378327509, 60.186976035), (-54.128327509, 63.936976035))
        make_face()
    extrude(amount=-CUT_EXTRUDE9_DEPTH, mode=Mode.SUBTRACT)

    # Sketch18 → Cut-Extrude10 (cut)
    with BuildSketch(Plane.XY.offset(28).offset(CUT_EXTRUDE10_START)):
        with Locations((-11.75246281, 35)):
            Circle(SKETCH18_R)
    extrude(amount=CUT_EXTRUDE10_DEPTH, mode=Mode.SUBTRACT)

    # Sketch19 → Boss-Extrude3 (add, two sides: drawn at the far end of the back side and taken through both)
    with BuildSketch(Plane.XY.offset(14).offset(-BOSS_EXTRUDE3_DEPTH_BACK)):
        with BuildLine():
            Line((-19.866362311, 14.172425126), (-11.5, 9))
            Line((-11.5, 9), (-11.5, 22.502549759))
            Line((-11.5, 22.502549759), (-17.501912014, 22.499999594))
            ThreePointArc((-17.501912014, 22.499999594), (-21.828891885, 19.229103353), (-19.866362311, 14.172425126))
        make_face()
        with Locations((-17.5, 18)):
            Circle(SKETCH19_R, mode=Mode.SUBTRACT)
    extrude(amount=BOSS_EXTRUDE3_DEPTH + BOSS_EXTRUDE3_DEPTH_BACK)

    # Cut-Extrude11: up to this face of the body (flat: up to its plane)
    cut_extrude11_end = Plane(part.part.faces().sort_by_distance((-6.507208391, 35, 8))[0])
    # Sketch20 → Cut-Extrude11 (cut, up to the picked face)
    with BuildSketch(Plane.XY.offset(28), mode=Mode.PRIVATE) as cut_extrude11_sk1:
        with Locations((-2.25, 47)):
            Rectangle(SKETCH20_W, SKETCH20_H)
    cut_extrude11_tool1 = split(extrude(cut_extrude11_sk1.sketch, amount=-CUT_EXTRUDE11_REACH, mode=Mode.PRIVATE), bisect_by=cut_extrude11_end, keep=Keep.BOTH, mode=Mode.PRIVATE)
    add(cut_extrude11_tool1.solids().sort_by(Axis((-2.25, 47, 28), (0, 0, -1)))[0], mode=Mode.SUBTRACT)

    # Sketch21 → Cut-Extrude12 (cut)
    with BuildSketch(Plane.XY.offset(8)):
        with Locations((-2.25, 54.25)):
            Rectangle(SKETCH21_W, SKETCH21_H)
    extrude(amount=-CUT_EXTRUDE12_DEPTH, mode=Mode.SUBTRACT)

    # Sketch22 → Cut-Extrude13 (cut)
    with BuildSketch(Plane.ZY.offset(11.5)):
        with Locations((6.75, 29.25)):
            Rectangle(SKETCH22_W, SKETCH22_H)
        with Locations((22.75, 24.150410391)):
            Rectangle(SKETCH22_W_2, SKETCH22_H_2)
    extrude(amount=-CUT_EXTRUDE13_DEPTH, mode=Mode.SUBTRACT)

    # Fillet5
    fillet5_edges = [part.edges().sort_by_distance(p)[0] for p in [
        (-11.5, 59, 1.5),
        (-9.5, 49.5, 5.5),
    ]]
    fillet(fillet5_edges, radius=FILLET5_R)

    # Sketch23 → Cut-Extrude14 (cut)
    with BuildSketch(Plane.XY.offset(8)):
        with BuildLine():
            Line((-9.5, 40), (-8.5, 40))
            ThreePointArc((-8.5, 40), (-3.5, 35), (-8.5, 30))
            Line((-8.5, 30), (-9.5, 30))
            ThreePointArc((-9.5, 30), (-14.5, 35), (-9.5, 40))
        make_face()
    extrude(amount=-CUT_EXTRUDE14_DEPTH, mode=Mode.SUBTRACT)


solid = part.part
